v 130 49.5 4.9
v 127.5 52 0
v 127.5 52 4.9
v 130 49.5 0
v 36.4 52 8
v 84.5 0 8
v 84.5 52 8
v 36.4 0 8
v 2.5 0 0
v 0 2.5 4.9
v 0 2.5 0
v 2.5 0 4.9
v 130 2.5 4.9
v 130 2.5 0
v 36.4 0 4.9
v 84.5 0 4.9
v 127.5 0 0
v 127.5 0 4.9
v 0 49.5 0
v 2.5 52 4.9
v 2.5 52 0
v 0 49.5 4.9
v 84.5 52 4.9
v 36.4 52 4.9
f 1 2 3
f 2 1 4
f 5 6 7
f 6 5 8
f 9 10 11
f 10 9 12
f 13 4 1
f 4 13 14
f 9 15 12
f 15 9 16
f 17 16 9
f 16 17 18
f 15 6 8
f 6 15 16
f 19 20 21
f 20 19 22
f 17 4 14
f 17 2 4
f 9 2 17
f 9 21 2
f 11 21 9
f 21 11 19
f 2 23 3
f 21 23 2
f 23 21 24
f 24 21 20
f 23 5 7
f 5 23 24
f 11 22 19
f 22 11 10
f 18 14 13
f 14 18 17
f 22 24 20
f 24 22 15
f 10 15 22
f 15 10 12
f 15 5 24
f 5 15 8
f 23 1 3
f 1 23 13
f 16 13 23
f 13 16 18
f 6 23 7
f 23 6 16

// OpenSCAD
$fn = 32;

// ----------------------------------------------------------------------
// Stepped bar: centerstep, 130 x 52 x 8/4.9 mm
// ----------------------------------------------------------------------

// --- parameters (mm) ---
bar_l = 130;              // bar length, X
bar_w = 52;               // bar width, Y
plate_t = 8;              // thickness of the thick zone, Z
thin_t = 4.9;             // thickness of the thin zone
corner_c = 2.5;           // corner chamfer of the bar
step_cut = 3.1;           // material removed from the thin zone
thick_from = 36.4;        // start of the thick middle zone
thick_to = 84.5;          // end of the thick middle zone
depth_1 = 3.1;            // depth of cut 1 from the top face
depth_2 = 3.1;            // depth of cut 2 from the top face
fit_tol = 0.05;           // declared fit tolerance (prompt contract)
free_tol = 0.3;           // declared free tolerance (prompt contract)

profile = [[2.5, 0], [127.5, 0], [130, 2.5], [130, 49.5], [127.5, 52], [2.5, 52], [0, 49.5], [0, 2.5]];  // primary outline, 8 points, counter clockwise
void_1 = [[-1, -1], [36.4, -1], [36.4, 53], [-1, 53]];  // thin left end, 4 points
void_2 = [[84.5, -1], [131, -1], [131, 53], [84.5, 53]];  // thin right end, 4 points

// --- the one profile operation ---
difference() {
  linear_extrude(height = plate_t) polygon(points = profile);
  translate([0, 0, plate_t - depth_1])
    linear_extrude(height = depth_1 + 1) polygon(points = void_1);
  translate([0, 0, plate_t - depth_2])
    linear_extrude(height = depth_2 + 1) polygon(points = void_2);
}
